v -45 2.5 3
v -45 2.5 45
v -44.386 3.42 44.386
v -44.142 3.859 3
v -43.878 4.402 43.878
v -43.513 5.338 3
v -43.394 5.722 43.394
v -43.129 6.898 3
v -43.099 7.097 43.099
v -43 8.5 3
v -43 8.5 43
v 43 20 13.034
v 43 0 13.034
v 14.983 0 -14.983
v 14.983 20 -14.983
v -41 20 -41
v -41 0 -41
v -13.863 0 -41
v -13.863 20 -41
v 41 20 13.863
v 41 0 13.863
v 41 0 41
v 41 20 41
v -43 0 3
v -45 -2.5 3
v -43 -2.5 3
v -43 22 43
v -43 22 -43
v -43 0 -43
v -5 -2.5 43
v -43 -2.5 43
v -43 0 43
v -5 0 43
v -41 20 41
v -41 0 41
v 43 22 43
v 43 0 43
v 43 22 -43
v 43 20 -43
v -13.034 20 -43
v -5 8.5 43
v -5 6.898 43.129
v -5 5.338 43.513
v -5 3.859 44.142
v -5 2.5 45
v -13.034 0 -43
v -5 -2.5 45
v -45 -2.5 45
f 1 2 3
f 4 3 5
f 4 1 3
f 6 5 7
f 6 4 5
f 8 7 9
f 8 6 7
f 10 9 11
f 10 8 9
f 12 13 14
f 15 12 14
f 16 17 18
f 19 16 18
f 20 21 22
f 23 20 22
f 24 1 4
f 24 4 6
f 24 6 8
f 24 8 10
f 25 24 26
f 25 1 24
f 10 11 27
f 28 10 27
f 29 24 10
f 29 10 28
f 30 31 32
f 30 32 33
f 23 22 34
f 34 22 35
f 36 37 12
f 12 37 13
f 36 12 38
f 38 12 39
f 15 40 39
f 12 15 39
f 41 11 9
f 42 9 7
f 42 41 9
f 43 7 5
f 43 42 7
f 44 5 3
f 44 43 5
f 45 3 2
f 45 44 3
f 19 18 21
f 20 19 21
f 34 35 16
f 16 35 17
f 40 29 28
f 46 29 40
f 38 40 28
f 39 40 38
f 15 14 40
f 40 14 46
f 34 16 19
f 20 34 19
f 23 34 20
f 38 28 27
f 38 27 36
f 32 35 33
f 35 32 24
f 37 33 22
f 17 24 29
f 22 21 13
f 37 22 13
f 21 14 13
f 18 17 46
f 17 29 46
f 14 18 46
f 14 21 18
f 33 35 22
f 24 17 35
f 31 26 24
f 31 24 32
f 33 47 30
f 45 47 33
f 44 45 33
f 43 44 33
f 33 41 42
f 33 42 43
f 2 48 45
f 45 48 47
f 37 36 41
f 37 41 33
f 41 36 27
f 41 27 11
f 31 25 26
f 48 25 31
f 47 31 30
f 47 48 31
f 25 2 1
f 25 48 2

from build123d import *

# Parameters (mm, degrees)
BOSS_EXTRUDE1_DEPTH = 20
SKETCH2_W           = 86
SKETCH2_H           = 86
BOSS_EXTRUDE2_DEPTH = 2
CUT_EXTRUDE1_DEPTH  = 20
SKETCH4_W           = 2
SKETCH4_H           = 40
SKETCH4_W_2         = 40
SKETCH4_H_2         = 2
BOSS_EXTRUDE4_DEPTH = 2.5
FILLET1_R           = 10


with BuildPart() as part:
    # Sketch1 → Boss-Extrude1 (new body)
    with BuildSketch(Plane(origin=(0, 0, 0), x_dir=(1, 0, 0), z_dir=(0, 1, 0))):
        Polygon((-43, 43), (-43, -43), (14.982756057, 14.982756057), (-13.034487885, 43), align=None)
        Polygon((14.982756057, 14.982756057), (-43, -43), (43, -43), (43, -13.034487885), align=None)
    extrude(amount=BOSS_EXTRUDE1_DEPTH)

    # Sketch2 → Boss-Extrude2 (add)
    with BuildSketch(Plane(origin=(0, 20, 0), x_dir=(1, 0, 0), z_dir=(0, 1, 0))):
        Rectangle(SKETCH2_W, SKETCH2_H)
    extrude(amount=BOSS_EXTRUDE2_DEPTH)

    # Sketch3 → Cut-Extrude1 (cut)
    with BuildSketch(Plane.XZ):
        Polygon((-13.86291501, -41), (41, 13.86291501), (41, 41), (-41, 41), (-41, -41), align=None)
    extrude(amount=-CUT_EXTRUDE1_DEPTH, mode=Mode.SUBTRACT)

    # Sketch4 → Boss-Extrude4 (add, symmetric)
    with BuildSketch(Plane.XZ):
        with Locations((-44, 23)):
            Rectangle(SKETCH4_W, SKETCH4_H)
        with Locations((-25, 44)):
            Rectangle(SKETCH4_W_2, SKETCH4_H_2)
    extrude(amount=BOSS_EXTRUDE4_DEPTH, both=True)

    # Fillet1
    # the kernel refuses this fillet: 10 mm, written as the material it adds along each edge
    with BuildSketch(Plane(origin=(-43, 2.5, 3), x_dir=(0, 1, 0), z_dir=(0, 0, 1))) as fillet1_piece_1:
        with BuildLine():
            CenterArc((6, 10), FILLET1_R, 233.130102354, 36.869897646)
            Line((0, 2), (-0.12, 1.84))
            ThreePointArc((-0.12, 1.84), (-0.2, 1), (-0.2, 0))
            Line((-0.2, 0), (0, -0.2))
            Line((0, -0.2), (6, -0.2))
            Line((6, -0.2), (6, 0))
        make_face()
    extrude(amount=40)
    with BuildSketch(Plane(origin=(-5, 2.5, 43), x_dir=(0, 0, 1), z_dir=(-1, 0, 0))) as fillet1_piece_2:
        with BuildLine():
            CenterArc((10, 6), FILLET1_R, 180, 36.869897646)
            Line((0, 6), (-0.2, 6))
            Line((-0.2, 6), (-0.2, 0))
            Line((-0.2, 0), (0, -0.2))
            ThreePointArc((0, -0.2), (1, -0.2), (1.84, -0.12))
            Line((1.84, -0.12), (2, 0))
        make_face()
    extrude(amount=38)
    with BuildSketch(Plane(origin=(-43, 2.5, 3), x_dir=(0, 1, 0), z_dir=(0, 0, 1))) as fillet1_piece_3a_section:
        with BuildLine():
            CenterArc((6, 10), FILLET1_R, 233.130102354, 36.869897646)
            Line((0, 2), (-0.12, 1.84))
            ThreePointArc((-0.12, 1.84), (-0.2, 1), (-0.2, 0))
            Line((-0.2, 0), (0, -0.2))
            Line((0, -0.2), (6, -0.2))
            Line((6, -0.2), (6, 0))
        make_face()
    fillet1_piece_3a = extrude(amount=55, mode=Mode.PRIVATE)
    fillet1_piece_3a = split(fillet1_piece_3a, bisect_by=Plane(origin=(-43.452376795, 4.199345627, 43), z_dir=(0, 0, 1)), keep=Keep.TOP, mode=Mode.PRIVATE)
    fillet1_piece_3a = split(fillet1_piece_3a, bisect_by=Plane(origin=(-43.452376795, 4.199345627, 45), z_dir=(0, 0, -1)), keep=Keep.TOP, mode=Mode.PRIVATE)
    with BuildSketch(Plane(origin=(-5, 2.5, 43), x_dir=(0, 0, 1), z_dir=(-1, 0, 0))) as fillet1_piece_3b_section:
        with BuildLine():
            CenterArc((10, 6), FILLET1_R, 180, 36.869897646)
            Line((0, 6), (-0.2, 6))
            Line((-0.2, 6), (-0.2, 0))
            Line((-0.2, 0), (0, -0.2))
            ThreePointArc((0, -0.2), (1, -0.2), (1.84, -0.12))
            Line((1.84, -0.12), (2, 0))
        make_face()
    fillet1_piece_3b = extrude(amount=53, mode=Mode.PRIVATE)
    fillet1_piece_3b = split(fillet1_piece_3b, bisect_by=Plane(origin=(-43, 4.199345627, 43.452376795), z_dir=(-1, 0, 0)), keep=Keep.TOP, mode=Mode.PRIVATE)
    fillet1_piece_3b = split(fillet1_piece_3b, bisect_by=Plane(origin=(-45, 4.199345627, 43.452376795), z_dir=(1, 0, 0)), keep=Keep.TOP, mode=Mode.PRIVATE)
    fillet1_piece_3 = fillet1_piece_3a & fillet1_piece_3b
    add(fillet1_piece_3)


solid = part.part
